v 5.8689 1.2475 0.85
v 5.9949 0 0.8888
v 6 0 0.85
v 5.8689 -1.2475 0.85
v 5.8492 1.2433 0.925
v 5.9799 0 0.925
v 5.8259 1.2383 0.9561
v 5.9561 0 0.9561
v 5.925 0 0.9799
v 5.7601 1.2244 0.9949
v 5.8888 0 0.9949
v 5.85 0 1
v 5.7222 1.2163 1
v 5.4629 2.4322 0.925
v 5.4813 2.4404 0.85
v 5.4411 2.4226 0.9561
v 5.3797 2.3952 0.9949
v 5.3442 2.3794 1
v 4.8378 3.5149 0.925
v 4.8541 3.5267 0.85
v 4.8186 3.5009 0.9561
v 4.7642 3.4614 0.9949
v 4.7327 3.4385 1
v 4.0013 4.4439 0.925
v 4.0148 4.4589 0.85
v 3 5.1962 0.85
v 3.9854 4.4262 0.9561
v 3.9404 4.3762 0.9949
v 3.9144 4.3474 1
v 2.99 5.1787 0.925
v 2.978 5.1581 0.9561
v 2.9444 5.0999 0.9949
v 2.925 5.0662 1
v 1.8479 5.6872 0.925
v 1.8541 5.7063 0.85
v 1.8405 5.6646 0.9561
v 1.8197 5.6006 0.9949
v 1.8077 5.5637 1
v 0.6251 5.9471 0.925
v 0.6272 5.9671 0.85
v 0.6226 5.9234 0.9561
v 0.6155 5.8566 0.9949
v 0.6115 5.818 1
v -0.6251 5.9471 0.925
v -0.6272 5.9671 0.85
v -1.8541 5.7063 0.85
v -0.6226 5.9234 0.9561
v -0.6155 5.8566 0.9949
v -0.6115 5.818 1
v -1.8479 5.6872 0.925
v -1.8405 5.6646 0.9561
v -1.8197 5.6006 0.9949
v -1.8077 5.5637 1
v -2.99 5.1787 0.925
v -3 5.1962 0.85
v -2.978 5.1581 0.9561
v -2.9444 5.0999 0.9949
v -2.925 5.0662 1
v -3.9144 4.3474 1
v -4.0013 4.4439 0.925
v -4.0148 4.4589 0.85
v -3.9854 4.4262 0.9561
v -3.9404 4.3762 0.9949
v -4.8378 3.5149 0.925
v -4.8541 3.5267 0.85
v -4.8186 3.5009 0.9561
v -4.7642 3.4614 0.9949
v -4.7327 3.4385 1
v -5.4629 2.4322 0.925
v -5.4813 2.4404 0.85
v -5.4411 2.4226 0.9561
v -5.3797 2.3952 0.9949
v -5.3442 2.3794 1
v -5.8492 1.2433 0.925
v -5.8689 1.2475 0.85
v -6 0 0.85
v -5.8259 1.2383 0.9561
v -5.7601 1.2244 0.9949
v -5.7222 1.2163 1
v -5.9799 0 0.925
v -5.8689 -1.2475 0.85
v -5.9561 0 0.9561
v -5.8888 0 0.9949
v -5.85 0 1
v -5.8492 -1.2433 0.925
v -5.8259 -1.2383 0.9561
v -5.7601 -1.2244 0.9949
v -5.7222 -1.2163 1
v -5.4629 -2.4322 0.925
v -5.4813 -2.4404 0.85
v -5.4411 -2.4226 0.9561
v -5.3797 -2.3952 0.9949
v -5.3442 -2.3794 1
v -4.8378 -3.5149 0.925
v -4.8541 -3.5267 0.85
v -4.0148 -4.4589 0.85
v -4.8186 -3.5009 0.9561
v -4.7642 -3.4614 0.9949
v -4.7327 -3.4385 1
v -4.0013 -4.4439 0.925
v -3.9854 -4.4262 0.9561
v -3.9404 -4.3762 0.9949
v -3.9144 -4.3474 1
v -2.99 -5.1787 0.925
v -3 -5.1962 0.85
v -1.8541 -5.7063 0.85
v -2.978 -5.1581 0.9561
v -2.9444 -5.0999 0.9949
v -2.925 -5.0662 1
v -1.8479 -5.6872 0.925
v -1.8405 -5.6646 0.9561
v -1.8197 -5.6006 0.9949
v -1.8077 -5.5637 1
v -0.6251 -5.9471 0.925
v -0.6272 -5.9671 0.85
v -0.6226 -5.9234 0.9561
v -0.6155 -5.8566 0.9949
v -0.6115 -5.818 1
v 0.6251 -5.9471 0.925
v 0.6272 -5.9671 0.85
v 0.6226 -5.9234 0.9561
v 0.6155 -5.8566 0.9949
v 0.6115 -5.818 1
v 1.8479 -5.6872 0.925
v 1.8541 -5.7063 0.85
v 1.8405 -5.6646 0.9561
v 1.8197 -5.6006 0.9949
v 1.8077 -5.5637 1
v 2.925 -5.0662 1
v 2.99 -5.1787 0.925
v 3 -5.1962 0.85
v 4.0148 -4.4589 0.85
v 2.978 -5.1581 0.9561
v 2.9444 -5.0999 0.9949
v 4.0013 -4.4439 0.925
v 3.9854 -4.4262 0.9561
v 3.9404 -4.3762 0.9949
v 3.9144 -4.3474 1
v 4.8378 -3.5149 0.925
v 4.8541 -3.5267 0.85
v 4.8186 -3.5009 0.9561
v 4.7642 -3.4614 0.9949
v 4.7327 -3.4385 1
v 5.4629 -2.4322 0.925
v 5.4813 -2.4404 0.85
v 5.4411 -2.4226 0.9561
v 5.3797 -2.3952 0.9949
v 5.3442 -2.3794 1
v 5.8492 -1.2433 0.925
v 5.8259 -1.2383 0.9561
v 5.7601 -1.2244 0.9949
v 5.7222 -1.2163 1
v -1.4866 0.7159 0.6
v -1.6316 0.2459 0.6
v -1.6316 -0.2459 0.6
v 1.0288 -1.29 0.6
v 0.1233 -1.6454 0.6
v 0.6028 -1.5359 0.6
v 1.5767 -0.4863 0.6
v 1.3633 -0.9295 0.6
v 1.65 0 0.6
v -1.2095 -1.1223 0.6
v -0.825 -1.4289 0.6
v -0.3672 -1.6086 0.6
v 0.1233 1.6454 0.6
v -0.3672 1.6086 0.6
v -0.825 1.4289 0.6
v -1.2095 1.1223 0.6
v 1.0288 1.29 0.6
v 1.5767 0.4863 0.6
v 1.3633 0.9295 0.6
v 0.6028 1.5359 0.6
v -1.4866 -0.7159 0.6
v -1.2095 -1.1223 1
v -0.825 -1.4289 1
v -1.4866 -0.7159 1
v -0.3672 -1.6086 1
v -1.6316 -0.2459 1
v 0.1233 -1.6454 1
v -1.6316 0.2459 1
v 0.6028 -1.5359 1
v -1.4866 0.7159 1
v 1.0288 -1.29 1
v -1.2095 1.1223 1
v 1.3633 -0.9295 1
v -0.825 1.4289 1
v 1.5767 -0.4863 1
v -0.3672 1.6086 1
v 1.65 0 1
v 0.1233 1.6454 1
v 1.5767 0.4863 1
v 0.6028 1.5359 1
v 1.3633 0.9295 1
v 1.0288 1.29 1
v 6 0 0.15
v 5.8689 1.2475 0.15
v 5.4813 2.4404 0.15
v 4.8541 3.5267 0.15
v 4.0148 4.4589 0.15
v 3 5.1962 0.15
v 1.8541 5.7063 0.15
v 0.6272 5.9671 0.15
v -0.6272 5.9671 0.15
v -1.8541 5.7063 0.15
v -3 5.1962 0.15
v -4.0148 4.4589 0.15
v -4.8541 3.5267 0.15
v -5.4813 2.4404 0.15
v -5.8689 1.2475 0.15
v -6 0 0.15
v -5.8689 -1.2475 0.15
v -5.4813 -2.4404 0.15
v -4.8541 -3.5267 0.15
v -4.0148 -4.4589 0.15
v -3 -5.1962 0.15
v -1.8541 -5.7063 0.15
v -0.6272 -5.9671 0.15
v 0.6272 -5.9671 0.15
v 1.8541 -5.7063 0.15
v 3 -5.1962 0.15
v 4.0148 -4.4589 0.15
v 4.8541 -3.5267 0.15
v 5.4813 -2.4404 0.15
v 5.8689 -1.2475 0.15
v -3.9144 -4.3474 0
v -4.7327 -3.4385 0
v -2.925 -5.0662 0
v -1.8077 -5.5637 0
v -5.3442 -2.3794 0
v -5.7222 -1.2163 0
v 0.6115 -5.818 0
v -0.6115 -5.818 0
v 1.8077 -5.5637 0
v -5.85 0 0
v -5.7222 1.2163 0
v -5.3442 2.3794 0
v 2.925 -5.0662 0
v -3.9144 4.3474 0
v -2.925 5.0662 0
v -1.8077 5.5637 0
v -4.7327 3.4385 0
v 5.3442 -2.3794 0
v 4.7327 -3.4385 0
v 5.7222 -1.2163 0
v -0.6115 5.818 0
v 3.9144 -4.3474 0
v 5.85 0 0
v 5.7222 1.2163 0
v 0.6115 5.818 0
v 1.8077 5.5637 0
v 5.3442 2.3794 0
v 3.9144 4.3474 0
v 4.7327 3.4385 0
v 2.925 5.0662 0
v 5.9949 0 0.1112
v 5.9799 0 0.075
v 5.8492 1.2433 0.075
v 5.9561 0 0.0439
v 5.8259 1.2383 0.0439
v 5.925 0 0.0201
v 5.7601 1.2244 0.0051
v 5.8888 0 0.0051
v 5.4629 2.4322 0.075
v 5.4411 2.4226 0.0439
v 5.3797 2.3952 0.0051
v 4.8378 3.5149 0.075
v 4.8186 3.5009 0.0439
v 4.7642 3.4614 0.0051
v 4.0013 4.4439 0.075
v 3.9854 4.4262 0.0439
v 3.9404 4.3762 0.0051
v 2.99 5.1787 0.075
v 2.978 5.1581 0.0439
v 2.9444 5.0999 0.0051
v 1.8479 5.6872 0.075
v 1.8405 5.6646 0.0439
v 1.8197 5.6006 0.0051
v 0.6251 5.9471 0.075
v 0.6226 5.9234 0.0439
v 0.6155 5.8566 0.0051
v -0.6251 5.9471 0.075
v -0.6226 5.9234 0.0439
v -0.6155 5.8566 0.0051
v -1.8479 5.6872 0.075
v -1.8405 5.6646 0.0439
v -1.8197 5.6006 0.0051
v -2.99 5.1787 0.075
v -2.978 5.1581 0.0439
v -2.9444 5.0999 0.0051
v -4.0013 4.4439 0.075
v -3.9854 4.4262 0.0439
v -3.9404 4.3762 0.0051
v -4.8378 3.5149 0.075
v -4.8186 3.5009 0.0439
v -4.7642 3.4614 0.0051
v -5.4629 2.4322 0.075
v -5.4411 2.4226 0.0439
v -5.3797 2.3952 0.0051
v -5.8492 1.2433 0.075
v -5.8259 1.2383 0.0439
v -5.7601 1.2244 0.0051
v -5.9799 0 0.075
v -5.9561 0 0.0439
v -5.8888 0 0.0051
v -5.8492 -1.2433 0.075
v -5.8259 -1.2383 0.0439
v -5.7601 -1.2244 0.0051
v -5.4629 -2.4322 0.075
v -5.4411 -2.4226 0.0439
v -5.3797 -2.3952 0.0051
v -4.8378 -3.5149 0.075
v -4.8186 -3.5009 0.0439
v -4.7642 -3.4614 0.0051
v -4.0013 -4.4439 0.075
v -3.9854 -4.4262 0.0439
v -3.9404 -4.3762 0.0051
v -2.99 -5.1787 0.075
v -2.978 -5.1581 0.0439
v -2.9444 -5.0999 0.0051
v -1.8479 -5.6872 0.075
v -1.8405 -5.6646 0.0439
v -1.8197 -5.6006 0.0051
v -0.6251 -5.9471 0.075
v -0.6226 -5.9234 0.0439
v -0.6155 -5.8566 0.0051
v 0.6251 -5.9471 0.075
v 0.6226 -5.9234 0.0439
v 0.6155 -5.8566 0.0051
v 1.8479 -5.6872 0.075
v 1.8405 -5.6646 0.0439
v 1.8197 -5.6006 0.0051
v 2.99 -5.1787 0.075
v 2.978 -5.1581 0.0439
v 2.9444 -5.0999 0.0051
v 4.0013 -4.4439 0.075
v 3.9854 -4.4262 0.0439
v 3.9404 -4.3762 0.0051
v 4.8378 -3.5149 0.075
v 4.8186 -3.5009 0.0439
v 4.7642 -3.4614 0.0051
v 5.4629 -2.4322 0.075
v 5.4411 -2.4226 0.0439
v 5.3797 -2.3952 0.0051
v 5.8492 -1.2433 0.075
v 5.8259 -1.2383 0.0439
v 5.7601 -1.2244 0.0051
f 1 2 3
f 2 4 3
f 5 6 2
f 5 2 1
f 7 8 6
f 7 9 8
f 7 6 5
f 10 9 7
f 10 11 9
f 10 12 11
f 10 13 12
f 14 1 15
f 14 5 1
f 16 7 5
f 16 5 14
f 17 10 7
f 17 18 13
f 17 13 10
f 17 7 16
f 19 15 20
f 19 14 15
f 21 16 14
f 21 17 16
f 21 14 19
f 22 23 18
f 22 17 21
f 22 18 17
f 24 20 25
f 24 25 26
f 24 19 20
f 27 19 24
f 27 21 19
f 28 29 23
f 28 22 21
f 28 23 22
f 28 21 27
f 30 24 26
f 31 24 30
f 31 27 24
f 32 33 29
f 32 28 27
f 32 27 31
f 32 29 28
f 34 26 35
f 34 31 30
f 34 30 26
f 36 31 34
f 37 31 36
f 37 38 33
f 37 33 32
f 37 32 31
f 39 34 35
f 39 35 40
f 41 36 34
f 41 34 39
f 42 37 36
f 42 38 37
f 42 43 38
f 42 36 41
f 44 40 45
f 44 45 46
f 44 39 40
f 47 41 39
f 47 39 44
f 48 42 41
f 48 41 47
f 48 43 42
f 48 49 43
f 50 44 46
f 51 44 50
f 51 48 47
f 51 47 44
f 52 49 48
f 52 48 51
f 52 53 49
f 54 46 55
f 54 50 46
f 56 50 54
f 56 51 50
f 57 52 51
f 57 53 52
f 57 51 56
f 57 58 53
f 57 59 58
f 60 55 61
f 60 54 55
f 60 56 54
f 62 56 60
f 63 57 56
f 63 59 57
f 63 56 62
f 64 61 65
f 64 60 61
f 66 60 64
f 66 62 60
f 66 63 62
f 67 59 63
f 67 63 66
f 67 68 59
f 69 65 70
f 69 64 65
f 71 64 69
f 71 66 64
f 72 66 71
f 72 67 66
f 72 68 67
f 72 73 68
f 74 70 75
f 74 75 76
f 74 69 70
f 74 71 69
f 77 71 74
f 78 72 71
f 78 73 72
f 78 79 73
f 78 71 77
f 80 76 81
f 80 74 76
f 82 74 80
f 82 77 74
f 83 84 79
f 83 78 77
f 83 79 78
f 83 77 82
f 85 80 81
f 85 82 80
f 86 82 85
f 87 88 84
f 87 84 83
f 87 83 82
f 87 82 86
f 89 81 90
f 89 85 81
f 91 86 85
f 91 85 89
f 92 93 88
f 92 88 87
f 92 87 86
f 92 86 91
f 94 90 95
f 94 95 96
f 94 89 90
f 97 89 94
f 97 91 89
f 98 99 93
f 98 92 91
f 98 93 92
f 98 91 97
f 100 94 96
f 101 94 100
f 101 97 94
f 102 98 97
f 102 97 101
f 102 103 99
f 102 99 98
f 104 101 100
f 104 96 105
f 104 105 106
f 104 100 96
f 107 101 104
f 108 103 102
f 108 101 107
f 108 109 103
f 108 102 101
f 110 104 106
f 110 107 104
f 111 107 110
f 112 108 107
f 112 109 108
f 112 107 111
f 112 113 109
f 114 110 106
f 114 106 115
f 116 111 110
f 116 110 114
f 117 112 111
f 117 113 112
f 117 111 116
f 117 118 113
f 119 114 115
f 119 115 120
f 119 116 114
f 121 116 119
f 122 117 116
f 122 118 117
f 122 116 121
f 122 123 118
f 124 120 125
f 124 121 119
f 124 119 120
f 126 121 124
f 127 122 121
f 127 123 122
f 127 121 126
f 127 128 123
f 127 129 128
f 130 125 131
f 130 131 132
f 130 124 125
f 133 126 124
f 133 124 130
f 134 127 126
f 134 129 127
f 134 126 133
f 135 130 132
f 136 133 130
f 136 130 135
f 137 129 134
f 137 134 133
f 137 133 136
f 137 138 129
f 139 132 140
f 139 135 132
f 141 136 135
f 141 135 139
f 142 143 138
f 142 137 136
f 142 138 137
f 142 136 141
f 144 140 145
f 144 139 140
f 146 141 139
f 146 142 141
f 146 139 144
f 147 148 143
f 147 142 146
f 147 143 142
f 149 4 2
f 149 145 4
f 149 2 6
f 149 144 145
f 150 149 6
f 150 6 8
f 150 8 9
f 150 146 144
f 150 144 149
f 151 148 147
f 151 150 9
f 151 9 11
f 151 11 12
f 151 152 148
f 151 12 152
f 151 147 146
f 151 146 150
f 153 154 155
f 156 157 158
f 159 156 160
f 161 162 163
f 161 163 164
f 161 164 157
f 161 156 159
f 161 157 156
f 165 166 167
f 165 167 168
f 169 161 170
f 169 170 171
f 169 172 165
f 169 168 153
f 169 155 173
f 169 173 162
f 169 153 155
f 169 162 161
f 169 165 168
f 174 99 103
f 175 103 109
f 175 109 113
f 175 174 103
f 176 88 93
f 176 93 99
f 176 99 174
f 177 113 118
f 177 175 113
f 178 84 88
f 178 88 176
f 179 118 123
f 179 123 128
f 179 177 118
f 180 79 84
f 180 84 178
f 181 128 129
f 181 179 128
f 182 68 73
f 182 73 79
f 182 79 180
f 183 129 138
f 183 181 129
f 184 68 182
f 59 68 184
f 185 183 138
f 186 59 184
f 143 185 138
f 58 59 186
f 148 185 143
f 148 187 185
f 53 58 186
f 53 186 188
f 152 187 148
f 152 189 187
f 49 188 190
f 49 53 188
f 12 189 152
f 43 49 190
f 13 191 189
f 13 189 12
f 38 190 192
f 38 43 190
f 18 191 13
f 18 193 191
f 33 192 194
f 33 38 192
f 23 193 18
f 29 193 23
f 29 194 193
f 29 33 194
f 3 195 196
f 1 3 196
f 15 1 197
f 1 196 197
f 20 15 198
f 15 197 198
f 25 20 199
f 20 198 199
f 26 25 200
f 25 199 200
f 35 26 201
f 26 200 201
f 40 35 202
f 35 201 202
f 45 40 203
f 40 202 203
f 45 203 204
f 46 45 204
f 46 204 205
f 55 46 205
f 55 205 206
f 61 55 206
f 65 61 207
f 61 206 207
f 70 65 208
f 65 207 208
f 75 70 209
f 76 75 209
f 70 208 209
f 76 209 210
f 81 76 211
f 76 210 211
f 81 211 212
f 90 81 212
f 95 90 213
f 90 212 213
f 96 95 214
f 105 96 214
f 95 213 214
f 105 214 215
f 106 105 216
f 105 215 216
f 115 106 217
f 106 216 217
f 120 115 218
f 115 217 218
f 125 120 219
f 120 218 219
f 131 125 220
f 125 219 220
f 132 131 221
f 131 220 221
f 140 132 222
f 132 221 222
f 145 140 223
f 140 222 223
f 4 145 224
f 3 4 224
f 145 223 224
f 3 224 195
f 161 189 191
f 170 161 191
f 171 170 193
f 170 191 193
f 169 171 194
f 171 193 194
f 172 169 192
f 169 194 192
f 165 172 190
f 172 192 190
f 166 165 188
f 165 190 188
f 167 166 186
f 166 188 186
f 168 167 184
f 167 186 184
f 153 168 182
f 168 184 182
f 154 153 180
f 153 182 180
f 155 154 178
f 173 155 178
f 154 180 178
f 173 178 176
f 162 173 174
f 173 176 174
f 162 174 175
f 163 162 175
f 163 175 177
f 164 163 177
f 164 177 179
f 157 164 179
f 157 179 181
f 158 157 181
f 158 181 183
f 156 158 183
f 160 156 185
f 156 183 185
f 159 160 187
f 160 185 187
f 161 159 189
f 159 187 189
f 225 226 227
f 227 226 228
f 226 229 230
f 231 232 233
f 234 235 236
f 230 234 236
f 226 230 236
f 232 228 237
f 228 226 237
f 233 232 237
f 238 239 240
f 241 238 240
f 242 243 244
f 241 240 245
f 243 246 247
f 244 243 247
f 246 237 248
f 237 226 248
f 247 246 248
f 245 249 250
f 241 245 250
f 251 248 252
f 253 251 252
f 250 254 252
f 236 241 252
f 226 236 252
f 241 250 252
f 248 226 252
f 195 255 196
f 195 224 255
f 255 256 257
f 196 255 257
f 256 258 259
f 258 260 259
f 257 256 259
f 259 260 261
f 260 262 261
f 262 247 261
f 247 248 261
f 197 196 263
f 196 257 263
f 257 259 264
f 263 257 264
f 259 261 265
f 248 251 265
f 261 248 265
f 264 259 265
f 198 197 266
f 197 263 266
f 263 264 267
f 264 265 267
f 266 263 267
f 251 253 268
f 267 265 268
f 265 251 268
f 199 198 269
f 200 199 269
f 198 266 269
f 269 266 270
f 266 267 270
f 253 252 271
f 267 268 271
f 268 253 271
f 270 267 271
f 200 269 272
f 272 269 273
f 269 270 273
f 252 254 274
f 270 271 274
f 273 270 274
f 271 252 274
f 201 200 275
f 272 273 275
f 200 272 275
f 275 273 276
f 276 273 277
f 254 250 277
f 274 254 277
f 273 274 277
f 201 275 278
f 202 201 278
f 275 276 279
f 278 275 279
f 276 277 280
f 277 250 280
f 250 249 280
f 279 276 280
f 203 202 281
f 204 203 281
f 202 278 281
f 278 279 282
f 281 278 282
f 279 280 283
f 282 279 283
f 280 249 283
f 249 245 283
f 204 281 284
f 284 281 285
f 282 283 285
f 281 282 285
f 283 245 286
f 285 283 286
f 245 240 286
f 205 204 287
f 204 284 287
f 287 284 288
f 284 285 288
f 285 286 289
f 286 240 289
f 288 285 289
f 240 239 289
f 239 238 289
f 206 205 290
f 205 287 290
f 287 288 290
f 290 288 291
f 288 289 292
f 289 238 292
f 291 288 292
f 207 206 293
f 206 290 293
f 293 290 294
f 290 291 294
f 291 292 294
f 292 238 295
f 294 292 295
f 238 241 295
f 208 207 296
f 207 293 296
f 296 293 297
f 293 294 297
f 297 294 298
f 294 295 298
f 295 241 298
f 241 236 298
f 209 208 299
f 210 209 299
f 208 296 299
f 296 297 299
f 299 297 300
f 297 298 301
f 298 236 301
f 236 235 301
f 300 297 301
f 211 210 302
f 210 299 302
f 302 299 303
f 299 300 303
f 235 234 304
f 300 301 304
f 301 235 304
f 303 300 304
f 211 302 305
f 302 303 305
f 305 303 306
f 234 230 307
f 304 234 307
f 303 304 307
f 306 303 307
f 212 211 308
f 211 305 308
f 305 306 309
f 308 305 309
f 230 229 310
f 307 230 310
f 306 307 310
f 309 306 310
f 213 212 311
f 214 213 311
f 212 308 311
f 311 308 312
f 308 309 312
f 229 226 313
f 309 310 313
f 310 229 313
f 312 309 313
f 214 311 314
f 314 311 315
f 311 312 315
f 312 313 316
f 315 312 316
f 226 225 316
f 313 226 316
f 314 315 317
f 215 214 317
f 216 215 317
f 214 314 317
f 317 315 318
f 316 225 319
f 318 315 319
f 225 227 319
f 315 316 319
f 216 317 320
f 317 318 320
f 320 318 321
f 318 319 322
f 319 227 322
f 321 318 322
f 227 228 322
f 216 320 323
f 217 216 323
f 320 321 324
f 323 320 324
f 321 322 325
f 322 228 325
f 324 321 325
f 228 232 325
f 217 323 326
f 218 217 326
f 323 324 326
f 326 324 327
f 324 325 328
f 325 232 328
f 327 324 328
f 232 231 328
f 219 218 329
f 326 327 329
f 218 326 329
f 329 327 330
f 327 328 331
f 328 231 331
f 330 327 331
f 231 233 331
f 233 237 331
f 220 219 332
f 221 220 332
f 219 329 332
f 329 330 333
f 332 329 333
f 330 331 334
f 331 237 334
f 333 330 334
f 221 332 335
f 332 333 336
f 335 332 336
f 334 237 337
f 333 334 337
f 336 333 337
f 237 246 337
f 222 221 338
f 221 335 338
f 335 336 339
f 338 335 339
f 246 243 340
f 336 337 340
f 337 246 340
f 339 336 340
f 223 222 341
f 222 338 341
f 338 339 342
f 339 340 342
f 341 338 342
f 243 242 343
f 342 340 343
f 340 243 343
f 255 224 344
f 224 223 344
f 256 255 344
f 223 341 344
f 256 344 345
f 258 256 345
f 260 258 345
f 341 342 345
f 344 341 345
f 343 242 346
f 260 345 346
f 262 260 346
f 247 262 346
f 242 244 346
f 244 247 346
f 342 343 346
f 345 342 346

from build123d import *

# Parameters (mm, degrees)
F0_R     = 6
F1_DEPTH = 1
F2_R     = 0.15
F3_R     = 1.65
F4_DEPTH = 0.4


# Not quite as in the source:
# - a feature names something its author has since deleted; it is built from what else it names


with BuildPart() as f1:
    # F0 (on Top) → F1 (new body)
    with BuildSketch(Plane.XY):
        Circle(F0_R)
    extrude(amount=F1_DEPTH)

    # F2
    f2_edges = [f1.edges().sort_by_distance(p)[0] for p in [
        (-6, 0, 1),
        (-6, 0, 0),
    ]]
    fillet(f2_edges, radius=F2_R)

    # F3 (on face) → F4 (cut)
    with BuildSketch(Plane.XY.offset(1)):
        Circle(F3_R)
    extrude(amount=-F4_DEPTH, mode=Mode.SUBTRACT)


solid = f1.part
